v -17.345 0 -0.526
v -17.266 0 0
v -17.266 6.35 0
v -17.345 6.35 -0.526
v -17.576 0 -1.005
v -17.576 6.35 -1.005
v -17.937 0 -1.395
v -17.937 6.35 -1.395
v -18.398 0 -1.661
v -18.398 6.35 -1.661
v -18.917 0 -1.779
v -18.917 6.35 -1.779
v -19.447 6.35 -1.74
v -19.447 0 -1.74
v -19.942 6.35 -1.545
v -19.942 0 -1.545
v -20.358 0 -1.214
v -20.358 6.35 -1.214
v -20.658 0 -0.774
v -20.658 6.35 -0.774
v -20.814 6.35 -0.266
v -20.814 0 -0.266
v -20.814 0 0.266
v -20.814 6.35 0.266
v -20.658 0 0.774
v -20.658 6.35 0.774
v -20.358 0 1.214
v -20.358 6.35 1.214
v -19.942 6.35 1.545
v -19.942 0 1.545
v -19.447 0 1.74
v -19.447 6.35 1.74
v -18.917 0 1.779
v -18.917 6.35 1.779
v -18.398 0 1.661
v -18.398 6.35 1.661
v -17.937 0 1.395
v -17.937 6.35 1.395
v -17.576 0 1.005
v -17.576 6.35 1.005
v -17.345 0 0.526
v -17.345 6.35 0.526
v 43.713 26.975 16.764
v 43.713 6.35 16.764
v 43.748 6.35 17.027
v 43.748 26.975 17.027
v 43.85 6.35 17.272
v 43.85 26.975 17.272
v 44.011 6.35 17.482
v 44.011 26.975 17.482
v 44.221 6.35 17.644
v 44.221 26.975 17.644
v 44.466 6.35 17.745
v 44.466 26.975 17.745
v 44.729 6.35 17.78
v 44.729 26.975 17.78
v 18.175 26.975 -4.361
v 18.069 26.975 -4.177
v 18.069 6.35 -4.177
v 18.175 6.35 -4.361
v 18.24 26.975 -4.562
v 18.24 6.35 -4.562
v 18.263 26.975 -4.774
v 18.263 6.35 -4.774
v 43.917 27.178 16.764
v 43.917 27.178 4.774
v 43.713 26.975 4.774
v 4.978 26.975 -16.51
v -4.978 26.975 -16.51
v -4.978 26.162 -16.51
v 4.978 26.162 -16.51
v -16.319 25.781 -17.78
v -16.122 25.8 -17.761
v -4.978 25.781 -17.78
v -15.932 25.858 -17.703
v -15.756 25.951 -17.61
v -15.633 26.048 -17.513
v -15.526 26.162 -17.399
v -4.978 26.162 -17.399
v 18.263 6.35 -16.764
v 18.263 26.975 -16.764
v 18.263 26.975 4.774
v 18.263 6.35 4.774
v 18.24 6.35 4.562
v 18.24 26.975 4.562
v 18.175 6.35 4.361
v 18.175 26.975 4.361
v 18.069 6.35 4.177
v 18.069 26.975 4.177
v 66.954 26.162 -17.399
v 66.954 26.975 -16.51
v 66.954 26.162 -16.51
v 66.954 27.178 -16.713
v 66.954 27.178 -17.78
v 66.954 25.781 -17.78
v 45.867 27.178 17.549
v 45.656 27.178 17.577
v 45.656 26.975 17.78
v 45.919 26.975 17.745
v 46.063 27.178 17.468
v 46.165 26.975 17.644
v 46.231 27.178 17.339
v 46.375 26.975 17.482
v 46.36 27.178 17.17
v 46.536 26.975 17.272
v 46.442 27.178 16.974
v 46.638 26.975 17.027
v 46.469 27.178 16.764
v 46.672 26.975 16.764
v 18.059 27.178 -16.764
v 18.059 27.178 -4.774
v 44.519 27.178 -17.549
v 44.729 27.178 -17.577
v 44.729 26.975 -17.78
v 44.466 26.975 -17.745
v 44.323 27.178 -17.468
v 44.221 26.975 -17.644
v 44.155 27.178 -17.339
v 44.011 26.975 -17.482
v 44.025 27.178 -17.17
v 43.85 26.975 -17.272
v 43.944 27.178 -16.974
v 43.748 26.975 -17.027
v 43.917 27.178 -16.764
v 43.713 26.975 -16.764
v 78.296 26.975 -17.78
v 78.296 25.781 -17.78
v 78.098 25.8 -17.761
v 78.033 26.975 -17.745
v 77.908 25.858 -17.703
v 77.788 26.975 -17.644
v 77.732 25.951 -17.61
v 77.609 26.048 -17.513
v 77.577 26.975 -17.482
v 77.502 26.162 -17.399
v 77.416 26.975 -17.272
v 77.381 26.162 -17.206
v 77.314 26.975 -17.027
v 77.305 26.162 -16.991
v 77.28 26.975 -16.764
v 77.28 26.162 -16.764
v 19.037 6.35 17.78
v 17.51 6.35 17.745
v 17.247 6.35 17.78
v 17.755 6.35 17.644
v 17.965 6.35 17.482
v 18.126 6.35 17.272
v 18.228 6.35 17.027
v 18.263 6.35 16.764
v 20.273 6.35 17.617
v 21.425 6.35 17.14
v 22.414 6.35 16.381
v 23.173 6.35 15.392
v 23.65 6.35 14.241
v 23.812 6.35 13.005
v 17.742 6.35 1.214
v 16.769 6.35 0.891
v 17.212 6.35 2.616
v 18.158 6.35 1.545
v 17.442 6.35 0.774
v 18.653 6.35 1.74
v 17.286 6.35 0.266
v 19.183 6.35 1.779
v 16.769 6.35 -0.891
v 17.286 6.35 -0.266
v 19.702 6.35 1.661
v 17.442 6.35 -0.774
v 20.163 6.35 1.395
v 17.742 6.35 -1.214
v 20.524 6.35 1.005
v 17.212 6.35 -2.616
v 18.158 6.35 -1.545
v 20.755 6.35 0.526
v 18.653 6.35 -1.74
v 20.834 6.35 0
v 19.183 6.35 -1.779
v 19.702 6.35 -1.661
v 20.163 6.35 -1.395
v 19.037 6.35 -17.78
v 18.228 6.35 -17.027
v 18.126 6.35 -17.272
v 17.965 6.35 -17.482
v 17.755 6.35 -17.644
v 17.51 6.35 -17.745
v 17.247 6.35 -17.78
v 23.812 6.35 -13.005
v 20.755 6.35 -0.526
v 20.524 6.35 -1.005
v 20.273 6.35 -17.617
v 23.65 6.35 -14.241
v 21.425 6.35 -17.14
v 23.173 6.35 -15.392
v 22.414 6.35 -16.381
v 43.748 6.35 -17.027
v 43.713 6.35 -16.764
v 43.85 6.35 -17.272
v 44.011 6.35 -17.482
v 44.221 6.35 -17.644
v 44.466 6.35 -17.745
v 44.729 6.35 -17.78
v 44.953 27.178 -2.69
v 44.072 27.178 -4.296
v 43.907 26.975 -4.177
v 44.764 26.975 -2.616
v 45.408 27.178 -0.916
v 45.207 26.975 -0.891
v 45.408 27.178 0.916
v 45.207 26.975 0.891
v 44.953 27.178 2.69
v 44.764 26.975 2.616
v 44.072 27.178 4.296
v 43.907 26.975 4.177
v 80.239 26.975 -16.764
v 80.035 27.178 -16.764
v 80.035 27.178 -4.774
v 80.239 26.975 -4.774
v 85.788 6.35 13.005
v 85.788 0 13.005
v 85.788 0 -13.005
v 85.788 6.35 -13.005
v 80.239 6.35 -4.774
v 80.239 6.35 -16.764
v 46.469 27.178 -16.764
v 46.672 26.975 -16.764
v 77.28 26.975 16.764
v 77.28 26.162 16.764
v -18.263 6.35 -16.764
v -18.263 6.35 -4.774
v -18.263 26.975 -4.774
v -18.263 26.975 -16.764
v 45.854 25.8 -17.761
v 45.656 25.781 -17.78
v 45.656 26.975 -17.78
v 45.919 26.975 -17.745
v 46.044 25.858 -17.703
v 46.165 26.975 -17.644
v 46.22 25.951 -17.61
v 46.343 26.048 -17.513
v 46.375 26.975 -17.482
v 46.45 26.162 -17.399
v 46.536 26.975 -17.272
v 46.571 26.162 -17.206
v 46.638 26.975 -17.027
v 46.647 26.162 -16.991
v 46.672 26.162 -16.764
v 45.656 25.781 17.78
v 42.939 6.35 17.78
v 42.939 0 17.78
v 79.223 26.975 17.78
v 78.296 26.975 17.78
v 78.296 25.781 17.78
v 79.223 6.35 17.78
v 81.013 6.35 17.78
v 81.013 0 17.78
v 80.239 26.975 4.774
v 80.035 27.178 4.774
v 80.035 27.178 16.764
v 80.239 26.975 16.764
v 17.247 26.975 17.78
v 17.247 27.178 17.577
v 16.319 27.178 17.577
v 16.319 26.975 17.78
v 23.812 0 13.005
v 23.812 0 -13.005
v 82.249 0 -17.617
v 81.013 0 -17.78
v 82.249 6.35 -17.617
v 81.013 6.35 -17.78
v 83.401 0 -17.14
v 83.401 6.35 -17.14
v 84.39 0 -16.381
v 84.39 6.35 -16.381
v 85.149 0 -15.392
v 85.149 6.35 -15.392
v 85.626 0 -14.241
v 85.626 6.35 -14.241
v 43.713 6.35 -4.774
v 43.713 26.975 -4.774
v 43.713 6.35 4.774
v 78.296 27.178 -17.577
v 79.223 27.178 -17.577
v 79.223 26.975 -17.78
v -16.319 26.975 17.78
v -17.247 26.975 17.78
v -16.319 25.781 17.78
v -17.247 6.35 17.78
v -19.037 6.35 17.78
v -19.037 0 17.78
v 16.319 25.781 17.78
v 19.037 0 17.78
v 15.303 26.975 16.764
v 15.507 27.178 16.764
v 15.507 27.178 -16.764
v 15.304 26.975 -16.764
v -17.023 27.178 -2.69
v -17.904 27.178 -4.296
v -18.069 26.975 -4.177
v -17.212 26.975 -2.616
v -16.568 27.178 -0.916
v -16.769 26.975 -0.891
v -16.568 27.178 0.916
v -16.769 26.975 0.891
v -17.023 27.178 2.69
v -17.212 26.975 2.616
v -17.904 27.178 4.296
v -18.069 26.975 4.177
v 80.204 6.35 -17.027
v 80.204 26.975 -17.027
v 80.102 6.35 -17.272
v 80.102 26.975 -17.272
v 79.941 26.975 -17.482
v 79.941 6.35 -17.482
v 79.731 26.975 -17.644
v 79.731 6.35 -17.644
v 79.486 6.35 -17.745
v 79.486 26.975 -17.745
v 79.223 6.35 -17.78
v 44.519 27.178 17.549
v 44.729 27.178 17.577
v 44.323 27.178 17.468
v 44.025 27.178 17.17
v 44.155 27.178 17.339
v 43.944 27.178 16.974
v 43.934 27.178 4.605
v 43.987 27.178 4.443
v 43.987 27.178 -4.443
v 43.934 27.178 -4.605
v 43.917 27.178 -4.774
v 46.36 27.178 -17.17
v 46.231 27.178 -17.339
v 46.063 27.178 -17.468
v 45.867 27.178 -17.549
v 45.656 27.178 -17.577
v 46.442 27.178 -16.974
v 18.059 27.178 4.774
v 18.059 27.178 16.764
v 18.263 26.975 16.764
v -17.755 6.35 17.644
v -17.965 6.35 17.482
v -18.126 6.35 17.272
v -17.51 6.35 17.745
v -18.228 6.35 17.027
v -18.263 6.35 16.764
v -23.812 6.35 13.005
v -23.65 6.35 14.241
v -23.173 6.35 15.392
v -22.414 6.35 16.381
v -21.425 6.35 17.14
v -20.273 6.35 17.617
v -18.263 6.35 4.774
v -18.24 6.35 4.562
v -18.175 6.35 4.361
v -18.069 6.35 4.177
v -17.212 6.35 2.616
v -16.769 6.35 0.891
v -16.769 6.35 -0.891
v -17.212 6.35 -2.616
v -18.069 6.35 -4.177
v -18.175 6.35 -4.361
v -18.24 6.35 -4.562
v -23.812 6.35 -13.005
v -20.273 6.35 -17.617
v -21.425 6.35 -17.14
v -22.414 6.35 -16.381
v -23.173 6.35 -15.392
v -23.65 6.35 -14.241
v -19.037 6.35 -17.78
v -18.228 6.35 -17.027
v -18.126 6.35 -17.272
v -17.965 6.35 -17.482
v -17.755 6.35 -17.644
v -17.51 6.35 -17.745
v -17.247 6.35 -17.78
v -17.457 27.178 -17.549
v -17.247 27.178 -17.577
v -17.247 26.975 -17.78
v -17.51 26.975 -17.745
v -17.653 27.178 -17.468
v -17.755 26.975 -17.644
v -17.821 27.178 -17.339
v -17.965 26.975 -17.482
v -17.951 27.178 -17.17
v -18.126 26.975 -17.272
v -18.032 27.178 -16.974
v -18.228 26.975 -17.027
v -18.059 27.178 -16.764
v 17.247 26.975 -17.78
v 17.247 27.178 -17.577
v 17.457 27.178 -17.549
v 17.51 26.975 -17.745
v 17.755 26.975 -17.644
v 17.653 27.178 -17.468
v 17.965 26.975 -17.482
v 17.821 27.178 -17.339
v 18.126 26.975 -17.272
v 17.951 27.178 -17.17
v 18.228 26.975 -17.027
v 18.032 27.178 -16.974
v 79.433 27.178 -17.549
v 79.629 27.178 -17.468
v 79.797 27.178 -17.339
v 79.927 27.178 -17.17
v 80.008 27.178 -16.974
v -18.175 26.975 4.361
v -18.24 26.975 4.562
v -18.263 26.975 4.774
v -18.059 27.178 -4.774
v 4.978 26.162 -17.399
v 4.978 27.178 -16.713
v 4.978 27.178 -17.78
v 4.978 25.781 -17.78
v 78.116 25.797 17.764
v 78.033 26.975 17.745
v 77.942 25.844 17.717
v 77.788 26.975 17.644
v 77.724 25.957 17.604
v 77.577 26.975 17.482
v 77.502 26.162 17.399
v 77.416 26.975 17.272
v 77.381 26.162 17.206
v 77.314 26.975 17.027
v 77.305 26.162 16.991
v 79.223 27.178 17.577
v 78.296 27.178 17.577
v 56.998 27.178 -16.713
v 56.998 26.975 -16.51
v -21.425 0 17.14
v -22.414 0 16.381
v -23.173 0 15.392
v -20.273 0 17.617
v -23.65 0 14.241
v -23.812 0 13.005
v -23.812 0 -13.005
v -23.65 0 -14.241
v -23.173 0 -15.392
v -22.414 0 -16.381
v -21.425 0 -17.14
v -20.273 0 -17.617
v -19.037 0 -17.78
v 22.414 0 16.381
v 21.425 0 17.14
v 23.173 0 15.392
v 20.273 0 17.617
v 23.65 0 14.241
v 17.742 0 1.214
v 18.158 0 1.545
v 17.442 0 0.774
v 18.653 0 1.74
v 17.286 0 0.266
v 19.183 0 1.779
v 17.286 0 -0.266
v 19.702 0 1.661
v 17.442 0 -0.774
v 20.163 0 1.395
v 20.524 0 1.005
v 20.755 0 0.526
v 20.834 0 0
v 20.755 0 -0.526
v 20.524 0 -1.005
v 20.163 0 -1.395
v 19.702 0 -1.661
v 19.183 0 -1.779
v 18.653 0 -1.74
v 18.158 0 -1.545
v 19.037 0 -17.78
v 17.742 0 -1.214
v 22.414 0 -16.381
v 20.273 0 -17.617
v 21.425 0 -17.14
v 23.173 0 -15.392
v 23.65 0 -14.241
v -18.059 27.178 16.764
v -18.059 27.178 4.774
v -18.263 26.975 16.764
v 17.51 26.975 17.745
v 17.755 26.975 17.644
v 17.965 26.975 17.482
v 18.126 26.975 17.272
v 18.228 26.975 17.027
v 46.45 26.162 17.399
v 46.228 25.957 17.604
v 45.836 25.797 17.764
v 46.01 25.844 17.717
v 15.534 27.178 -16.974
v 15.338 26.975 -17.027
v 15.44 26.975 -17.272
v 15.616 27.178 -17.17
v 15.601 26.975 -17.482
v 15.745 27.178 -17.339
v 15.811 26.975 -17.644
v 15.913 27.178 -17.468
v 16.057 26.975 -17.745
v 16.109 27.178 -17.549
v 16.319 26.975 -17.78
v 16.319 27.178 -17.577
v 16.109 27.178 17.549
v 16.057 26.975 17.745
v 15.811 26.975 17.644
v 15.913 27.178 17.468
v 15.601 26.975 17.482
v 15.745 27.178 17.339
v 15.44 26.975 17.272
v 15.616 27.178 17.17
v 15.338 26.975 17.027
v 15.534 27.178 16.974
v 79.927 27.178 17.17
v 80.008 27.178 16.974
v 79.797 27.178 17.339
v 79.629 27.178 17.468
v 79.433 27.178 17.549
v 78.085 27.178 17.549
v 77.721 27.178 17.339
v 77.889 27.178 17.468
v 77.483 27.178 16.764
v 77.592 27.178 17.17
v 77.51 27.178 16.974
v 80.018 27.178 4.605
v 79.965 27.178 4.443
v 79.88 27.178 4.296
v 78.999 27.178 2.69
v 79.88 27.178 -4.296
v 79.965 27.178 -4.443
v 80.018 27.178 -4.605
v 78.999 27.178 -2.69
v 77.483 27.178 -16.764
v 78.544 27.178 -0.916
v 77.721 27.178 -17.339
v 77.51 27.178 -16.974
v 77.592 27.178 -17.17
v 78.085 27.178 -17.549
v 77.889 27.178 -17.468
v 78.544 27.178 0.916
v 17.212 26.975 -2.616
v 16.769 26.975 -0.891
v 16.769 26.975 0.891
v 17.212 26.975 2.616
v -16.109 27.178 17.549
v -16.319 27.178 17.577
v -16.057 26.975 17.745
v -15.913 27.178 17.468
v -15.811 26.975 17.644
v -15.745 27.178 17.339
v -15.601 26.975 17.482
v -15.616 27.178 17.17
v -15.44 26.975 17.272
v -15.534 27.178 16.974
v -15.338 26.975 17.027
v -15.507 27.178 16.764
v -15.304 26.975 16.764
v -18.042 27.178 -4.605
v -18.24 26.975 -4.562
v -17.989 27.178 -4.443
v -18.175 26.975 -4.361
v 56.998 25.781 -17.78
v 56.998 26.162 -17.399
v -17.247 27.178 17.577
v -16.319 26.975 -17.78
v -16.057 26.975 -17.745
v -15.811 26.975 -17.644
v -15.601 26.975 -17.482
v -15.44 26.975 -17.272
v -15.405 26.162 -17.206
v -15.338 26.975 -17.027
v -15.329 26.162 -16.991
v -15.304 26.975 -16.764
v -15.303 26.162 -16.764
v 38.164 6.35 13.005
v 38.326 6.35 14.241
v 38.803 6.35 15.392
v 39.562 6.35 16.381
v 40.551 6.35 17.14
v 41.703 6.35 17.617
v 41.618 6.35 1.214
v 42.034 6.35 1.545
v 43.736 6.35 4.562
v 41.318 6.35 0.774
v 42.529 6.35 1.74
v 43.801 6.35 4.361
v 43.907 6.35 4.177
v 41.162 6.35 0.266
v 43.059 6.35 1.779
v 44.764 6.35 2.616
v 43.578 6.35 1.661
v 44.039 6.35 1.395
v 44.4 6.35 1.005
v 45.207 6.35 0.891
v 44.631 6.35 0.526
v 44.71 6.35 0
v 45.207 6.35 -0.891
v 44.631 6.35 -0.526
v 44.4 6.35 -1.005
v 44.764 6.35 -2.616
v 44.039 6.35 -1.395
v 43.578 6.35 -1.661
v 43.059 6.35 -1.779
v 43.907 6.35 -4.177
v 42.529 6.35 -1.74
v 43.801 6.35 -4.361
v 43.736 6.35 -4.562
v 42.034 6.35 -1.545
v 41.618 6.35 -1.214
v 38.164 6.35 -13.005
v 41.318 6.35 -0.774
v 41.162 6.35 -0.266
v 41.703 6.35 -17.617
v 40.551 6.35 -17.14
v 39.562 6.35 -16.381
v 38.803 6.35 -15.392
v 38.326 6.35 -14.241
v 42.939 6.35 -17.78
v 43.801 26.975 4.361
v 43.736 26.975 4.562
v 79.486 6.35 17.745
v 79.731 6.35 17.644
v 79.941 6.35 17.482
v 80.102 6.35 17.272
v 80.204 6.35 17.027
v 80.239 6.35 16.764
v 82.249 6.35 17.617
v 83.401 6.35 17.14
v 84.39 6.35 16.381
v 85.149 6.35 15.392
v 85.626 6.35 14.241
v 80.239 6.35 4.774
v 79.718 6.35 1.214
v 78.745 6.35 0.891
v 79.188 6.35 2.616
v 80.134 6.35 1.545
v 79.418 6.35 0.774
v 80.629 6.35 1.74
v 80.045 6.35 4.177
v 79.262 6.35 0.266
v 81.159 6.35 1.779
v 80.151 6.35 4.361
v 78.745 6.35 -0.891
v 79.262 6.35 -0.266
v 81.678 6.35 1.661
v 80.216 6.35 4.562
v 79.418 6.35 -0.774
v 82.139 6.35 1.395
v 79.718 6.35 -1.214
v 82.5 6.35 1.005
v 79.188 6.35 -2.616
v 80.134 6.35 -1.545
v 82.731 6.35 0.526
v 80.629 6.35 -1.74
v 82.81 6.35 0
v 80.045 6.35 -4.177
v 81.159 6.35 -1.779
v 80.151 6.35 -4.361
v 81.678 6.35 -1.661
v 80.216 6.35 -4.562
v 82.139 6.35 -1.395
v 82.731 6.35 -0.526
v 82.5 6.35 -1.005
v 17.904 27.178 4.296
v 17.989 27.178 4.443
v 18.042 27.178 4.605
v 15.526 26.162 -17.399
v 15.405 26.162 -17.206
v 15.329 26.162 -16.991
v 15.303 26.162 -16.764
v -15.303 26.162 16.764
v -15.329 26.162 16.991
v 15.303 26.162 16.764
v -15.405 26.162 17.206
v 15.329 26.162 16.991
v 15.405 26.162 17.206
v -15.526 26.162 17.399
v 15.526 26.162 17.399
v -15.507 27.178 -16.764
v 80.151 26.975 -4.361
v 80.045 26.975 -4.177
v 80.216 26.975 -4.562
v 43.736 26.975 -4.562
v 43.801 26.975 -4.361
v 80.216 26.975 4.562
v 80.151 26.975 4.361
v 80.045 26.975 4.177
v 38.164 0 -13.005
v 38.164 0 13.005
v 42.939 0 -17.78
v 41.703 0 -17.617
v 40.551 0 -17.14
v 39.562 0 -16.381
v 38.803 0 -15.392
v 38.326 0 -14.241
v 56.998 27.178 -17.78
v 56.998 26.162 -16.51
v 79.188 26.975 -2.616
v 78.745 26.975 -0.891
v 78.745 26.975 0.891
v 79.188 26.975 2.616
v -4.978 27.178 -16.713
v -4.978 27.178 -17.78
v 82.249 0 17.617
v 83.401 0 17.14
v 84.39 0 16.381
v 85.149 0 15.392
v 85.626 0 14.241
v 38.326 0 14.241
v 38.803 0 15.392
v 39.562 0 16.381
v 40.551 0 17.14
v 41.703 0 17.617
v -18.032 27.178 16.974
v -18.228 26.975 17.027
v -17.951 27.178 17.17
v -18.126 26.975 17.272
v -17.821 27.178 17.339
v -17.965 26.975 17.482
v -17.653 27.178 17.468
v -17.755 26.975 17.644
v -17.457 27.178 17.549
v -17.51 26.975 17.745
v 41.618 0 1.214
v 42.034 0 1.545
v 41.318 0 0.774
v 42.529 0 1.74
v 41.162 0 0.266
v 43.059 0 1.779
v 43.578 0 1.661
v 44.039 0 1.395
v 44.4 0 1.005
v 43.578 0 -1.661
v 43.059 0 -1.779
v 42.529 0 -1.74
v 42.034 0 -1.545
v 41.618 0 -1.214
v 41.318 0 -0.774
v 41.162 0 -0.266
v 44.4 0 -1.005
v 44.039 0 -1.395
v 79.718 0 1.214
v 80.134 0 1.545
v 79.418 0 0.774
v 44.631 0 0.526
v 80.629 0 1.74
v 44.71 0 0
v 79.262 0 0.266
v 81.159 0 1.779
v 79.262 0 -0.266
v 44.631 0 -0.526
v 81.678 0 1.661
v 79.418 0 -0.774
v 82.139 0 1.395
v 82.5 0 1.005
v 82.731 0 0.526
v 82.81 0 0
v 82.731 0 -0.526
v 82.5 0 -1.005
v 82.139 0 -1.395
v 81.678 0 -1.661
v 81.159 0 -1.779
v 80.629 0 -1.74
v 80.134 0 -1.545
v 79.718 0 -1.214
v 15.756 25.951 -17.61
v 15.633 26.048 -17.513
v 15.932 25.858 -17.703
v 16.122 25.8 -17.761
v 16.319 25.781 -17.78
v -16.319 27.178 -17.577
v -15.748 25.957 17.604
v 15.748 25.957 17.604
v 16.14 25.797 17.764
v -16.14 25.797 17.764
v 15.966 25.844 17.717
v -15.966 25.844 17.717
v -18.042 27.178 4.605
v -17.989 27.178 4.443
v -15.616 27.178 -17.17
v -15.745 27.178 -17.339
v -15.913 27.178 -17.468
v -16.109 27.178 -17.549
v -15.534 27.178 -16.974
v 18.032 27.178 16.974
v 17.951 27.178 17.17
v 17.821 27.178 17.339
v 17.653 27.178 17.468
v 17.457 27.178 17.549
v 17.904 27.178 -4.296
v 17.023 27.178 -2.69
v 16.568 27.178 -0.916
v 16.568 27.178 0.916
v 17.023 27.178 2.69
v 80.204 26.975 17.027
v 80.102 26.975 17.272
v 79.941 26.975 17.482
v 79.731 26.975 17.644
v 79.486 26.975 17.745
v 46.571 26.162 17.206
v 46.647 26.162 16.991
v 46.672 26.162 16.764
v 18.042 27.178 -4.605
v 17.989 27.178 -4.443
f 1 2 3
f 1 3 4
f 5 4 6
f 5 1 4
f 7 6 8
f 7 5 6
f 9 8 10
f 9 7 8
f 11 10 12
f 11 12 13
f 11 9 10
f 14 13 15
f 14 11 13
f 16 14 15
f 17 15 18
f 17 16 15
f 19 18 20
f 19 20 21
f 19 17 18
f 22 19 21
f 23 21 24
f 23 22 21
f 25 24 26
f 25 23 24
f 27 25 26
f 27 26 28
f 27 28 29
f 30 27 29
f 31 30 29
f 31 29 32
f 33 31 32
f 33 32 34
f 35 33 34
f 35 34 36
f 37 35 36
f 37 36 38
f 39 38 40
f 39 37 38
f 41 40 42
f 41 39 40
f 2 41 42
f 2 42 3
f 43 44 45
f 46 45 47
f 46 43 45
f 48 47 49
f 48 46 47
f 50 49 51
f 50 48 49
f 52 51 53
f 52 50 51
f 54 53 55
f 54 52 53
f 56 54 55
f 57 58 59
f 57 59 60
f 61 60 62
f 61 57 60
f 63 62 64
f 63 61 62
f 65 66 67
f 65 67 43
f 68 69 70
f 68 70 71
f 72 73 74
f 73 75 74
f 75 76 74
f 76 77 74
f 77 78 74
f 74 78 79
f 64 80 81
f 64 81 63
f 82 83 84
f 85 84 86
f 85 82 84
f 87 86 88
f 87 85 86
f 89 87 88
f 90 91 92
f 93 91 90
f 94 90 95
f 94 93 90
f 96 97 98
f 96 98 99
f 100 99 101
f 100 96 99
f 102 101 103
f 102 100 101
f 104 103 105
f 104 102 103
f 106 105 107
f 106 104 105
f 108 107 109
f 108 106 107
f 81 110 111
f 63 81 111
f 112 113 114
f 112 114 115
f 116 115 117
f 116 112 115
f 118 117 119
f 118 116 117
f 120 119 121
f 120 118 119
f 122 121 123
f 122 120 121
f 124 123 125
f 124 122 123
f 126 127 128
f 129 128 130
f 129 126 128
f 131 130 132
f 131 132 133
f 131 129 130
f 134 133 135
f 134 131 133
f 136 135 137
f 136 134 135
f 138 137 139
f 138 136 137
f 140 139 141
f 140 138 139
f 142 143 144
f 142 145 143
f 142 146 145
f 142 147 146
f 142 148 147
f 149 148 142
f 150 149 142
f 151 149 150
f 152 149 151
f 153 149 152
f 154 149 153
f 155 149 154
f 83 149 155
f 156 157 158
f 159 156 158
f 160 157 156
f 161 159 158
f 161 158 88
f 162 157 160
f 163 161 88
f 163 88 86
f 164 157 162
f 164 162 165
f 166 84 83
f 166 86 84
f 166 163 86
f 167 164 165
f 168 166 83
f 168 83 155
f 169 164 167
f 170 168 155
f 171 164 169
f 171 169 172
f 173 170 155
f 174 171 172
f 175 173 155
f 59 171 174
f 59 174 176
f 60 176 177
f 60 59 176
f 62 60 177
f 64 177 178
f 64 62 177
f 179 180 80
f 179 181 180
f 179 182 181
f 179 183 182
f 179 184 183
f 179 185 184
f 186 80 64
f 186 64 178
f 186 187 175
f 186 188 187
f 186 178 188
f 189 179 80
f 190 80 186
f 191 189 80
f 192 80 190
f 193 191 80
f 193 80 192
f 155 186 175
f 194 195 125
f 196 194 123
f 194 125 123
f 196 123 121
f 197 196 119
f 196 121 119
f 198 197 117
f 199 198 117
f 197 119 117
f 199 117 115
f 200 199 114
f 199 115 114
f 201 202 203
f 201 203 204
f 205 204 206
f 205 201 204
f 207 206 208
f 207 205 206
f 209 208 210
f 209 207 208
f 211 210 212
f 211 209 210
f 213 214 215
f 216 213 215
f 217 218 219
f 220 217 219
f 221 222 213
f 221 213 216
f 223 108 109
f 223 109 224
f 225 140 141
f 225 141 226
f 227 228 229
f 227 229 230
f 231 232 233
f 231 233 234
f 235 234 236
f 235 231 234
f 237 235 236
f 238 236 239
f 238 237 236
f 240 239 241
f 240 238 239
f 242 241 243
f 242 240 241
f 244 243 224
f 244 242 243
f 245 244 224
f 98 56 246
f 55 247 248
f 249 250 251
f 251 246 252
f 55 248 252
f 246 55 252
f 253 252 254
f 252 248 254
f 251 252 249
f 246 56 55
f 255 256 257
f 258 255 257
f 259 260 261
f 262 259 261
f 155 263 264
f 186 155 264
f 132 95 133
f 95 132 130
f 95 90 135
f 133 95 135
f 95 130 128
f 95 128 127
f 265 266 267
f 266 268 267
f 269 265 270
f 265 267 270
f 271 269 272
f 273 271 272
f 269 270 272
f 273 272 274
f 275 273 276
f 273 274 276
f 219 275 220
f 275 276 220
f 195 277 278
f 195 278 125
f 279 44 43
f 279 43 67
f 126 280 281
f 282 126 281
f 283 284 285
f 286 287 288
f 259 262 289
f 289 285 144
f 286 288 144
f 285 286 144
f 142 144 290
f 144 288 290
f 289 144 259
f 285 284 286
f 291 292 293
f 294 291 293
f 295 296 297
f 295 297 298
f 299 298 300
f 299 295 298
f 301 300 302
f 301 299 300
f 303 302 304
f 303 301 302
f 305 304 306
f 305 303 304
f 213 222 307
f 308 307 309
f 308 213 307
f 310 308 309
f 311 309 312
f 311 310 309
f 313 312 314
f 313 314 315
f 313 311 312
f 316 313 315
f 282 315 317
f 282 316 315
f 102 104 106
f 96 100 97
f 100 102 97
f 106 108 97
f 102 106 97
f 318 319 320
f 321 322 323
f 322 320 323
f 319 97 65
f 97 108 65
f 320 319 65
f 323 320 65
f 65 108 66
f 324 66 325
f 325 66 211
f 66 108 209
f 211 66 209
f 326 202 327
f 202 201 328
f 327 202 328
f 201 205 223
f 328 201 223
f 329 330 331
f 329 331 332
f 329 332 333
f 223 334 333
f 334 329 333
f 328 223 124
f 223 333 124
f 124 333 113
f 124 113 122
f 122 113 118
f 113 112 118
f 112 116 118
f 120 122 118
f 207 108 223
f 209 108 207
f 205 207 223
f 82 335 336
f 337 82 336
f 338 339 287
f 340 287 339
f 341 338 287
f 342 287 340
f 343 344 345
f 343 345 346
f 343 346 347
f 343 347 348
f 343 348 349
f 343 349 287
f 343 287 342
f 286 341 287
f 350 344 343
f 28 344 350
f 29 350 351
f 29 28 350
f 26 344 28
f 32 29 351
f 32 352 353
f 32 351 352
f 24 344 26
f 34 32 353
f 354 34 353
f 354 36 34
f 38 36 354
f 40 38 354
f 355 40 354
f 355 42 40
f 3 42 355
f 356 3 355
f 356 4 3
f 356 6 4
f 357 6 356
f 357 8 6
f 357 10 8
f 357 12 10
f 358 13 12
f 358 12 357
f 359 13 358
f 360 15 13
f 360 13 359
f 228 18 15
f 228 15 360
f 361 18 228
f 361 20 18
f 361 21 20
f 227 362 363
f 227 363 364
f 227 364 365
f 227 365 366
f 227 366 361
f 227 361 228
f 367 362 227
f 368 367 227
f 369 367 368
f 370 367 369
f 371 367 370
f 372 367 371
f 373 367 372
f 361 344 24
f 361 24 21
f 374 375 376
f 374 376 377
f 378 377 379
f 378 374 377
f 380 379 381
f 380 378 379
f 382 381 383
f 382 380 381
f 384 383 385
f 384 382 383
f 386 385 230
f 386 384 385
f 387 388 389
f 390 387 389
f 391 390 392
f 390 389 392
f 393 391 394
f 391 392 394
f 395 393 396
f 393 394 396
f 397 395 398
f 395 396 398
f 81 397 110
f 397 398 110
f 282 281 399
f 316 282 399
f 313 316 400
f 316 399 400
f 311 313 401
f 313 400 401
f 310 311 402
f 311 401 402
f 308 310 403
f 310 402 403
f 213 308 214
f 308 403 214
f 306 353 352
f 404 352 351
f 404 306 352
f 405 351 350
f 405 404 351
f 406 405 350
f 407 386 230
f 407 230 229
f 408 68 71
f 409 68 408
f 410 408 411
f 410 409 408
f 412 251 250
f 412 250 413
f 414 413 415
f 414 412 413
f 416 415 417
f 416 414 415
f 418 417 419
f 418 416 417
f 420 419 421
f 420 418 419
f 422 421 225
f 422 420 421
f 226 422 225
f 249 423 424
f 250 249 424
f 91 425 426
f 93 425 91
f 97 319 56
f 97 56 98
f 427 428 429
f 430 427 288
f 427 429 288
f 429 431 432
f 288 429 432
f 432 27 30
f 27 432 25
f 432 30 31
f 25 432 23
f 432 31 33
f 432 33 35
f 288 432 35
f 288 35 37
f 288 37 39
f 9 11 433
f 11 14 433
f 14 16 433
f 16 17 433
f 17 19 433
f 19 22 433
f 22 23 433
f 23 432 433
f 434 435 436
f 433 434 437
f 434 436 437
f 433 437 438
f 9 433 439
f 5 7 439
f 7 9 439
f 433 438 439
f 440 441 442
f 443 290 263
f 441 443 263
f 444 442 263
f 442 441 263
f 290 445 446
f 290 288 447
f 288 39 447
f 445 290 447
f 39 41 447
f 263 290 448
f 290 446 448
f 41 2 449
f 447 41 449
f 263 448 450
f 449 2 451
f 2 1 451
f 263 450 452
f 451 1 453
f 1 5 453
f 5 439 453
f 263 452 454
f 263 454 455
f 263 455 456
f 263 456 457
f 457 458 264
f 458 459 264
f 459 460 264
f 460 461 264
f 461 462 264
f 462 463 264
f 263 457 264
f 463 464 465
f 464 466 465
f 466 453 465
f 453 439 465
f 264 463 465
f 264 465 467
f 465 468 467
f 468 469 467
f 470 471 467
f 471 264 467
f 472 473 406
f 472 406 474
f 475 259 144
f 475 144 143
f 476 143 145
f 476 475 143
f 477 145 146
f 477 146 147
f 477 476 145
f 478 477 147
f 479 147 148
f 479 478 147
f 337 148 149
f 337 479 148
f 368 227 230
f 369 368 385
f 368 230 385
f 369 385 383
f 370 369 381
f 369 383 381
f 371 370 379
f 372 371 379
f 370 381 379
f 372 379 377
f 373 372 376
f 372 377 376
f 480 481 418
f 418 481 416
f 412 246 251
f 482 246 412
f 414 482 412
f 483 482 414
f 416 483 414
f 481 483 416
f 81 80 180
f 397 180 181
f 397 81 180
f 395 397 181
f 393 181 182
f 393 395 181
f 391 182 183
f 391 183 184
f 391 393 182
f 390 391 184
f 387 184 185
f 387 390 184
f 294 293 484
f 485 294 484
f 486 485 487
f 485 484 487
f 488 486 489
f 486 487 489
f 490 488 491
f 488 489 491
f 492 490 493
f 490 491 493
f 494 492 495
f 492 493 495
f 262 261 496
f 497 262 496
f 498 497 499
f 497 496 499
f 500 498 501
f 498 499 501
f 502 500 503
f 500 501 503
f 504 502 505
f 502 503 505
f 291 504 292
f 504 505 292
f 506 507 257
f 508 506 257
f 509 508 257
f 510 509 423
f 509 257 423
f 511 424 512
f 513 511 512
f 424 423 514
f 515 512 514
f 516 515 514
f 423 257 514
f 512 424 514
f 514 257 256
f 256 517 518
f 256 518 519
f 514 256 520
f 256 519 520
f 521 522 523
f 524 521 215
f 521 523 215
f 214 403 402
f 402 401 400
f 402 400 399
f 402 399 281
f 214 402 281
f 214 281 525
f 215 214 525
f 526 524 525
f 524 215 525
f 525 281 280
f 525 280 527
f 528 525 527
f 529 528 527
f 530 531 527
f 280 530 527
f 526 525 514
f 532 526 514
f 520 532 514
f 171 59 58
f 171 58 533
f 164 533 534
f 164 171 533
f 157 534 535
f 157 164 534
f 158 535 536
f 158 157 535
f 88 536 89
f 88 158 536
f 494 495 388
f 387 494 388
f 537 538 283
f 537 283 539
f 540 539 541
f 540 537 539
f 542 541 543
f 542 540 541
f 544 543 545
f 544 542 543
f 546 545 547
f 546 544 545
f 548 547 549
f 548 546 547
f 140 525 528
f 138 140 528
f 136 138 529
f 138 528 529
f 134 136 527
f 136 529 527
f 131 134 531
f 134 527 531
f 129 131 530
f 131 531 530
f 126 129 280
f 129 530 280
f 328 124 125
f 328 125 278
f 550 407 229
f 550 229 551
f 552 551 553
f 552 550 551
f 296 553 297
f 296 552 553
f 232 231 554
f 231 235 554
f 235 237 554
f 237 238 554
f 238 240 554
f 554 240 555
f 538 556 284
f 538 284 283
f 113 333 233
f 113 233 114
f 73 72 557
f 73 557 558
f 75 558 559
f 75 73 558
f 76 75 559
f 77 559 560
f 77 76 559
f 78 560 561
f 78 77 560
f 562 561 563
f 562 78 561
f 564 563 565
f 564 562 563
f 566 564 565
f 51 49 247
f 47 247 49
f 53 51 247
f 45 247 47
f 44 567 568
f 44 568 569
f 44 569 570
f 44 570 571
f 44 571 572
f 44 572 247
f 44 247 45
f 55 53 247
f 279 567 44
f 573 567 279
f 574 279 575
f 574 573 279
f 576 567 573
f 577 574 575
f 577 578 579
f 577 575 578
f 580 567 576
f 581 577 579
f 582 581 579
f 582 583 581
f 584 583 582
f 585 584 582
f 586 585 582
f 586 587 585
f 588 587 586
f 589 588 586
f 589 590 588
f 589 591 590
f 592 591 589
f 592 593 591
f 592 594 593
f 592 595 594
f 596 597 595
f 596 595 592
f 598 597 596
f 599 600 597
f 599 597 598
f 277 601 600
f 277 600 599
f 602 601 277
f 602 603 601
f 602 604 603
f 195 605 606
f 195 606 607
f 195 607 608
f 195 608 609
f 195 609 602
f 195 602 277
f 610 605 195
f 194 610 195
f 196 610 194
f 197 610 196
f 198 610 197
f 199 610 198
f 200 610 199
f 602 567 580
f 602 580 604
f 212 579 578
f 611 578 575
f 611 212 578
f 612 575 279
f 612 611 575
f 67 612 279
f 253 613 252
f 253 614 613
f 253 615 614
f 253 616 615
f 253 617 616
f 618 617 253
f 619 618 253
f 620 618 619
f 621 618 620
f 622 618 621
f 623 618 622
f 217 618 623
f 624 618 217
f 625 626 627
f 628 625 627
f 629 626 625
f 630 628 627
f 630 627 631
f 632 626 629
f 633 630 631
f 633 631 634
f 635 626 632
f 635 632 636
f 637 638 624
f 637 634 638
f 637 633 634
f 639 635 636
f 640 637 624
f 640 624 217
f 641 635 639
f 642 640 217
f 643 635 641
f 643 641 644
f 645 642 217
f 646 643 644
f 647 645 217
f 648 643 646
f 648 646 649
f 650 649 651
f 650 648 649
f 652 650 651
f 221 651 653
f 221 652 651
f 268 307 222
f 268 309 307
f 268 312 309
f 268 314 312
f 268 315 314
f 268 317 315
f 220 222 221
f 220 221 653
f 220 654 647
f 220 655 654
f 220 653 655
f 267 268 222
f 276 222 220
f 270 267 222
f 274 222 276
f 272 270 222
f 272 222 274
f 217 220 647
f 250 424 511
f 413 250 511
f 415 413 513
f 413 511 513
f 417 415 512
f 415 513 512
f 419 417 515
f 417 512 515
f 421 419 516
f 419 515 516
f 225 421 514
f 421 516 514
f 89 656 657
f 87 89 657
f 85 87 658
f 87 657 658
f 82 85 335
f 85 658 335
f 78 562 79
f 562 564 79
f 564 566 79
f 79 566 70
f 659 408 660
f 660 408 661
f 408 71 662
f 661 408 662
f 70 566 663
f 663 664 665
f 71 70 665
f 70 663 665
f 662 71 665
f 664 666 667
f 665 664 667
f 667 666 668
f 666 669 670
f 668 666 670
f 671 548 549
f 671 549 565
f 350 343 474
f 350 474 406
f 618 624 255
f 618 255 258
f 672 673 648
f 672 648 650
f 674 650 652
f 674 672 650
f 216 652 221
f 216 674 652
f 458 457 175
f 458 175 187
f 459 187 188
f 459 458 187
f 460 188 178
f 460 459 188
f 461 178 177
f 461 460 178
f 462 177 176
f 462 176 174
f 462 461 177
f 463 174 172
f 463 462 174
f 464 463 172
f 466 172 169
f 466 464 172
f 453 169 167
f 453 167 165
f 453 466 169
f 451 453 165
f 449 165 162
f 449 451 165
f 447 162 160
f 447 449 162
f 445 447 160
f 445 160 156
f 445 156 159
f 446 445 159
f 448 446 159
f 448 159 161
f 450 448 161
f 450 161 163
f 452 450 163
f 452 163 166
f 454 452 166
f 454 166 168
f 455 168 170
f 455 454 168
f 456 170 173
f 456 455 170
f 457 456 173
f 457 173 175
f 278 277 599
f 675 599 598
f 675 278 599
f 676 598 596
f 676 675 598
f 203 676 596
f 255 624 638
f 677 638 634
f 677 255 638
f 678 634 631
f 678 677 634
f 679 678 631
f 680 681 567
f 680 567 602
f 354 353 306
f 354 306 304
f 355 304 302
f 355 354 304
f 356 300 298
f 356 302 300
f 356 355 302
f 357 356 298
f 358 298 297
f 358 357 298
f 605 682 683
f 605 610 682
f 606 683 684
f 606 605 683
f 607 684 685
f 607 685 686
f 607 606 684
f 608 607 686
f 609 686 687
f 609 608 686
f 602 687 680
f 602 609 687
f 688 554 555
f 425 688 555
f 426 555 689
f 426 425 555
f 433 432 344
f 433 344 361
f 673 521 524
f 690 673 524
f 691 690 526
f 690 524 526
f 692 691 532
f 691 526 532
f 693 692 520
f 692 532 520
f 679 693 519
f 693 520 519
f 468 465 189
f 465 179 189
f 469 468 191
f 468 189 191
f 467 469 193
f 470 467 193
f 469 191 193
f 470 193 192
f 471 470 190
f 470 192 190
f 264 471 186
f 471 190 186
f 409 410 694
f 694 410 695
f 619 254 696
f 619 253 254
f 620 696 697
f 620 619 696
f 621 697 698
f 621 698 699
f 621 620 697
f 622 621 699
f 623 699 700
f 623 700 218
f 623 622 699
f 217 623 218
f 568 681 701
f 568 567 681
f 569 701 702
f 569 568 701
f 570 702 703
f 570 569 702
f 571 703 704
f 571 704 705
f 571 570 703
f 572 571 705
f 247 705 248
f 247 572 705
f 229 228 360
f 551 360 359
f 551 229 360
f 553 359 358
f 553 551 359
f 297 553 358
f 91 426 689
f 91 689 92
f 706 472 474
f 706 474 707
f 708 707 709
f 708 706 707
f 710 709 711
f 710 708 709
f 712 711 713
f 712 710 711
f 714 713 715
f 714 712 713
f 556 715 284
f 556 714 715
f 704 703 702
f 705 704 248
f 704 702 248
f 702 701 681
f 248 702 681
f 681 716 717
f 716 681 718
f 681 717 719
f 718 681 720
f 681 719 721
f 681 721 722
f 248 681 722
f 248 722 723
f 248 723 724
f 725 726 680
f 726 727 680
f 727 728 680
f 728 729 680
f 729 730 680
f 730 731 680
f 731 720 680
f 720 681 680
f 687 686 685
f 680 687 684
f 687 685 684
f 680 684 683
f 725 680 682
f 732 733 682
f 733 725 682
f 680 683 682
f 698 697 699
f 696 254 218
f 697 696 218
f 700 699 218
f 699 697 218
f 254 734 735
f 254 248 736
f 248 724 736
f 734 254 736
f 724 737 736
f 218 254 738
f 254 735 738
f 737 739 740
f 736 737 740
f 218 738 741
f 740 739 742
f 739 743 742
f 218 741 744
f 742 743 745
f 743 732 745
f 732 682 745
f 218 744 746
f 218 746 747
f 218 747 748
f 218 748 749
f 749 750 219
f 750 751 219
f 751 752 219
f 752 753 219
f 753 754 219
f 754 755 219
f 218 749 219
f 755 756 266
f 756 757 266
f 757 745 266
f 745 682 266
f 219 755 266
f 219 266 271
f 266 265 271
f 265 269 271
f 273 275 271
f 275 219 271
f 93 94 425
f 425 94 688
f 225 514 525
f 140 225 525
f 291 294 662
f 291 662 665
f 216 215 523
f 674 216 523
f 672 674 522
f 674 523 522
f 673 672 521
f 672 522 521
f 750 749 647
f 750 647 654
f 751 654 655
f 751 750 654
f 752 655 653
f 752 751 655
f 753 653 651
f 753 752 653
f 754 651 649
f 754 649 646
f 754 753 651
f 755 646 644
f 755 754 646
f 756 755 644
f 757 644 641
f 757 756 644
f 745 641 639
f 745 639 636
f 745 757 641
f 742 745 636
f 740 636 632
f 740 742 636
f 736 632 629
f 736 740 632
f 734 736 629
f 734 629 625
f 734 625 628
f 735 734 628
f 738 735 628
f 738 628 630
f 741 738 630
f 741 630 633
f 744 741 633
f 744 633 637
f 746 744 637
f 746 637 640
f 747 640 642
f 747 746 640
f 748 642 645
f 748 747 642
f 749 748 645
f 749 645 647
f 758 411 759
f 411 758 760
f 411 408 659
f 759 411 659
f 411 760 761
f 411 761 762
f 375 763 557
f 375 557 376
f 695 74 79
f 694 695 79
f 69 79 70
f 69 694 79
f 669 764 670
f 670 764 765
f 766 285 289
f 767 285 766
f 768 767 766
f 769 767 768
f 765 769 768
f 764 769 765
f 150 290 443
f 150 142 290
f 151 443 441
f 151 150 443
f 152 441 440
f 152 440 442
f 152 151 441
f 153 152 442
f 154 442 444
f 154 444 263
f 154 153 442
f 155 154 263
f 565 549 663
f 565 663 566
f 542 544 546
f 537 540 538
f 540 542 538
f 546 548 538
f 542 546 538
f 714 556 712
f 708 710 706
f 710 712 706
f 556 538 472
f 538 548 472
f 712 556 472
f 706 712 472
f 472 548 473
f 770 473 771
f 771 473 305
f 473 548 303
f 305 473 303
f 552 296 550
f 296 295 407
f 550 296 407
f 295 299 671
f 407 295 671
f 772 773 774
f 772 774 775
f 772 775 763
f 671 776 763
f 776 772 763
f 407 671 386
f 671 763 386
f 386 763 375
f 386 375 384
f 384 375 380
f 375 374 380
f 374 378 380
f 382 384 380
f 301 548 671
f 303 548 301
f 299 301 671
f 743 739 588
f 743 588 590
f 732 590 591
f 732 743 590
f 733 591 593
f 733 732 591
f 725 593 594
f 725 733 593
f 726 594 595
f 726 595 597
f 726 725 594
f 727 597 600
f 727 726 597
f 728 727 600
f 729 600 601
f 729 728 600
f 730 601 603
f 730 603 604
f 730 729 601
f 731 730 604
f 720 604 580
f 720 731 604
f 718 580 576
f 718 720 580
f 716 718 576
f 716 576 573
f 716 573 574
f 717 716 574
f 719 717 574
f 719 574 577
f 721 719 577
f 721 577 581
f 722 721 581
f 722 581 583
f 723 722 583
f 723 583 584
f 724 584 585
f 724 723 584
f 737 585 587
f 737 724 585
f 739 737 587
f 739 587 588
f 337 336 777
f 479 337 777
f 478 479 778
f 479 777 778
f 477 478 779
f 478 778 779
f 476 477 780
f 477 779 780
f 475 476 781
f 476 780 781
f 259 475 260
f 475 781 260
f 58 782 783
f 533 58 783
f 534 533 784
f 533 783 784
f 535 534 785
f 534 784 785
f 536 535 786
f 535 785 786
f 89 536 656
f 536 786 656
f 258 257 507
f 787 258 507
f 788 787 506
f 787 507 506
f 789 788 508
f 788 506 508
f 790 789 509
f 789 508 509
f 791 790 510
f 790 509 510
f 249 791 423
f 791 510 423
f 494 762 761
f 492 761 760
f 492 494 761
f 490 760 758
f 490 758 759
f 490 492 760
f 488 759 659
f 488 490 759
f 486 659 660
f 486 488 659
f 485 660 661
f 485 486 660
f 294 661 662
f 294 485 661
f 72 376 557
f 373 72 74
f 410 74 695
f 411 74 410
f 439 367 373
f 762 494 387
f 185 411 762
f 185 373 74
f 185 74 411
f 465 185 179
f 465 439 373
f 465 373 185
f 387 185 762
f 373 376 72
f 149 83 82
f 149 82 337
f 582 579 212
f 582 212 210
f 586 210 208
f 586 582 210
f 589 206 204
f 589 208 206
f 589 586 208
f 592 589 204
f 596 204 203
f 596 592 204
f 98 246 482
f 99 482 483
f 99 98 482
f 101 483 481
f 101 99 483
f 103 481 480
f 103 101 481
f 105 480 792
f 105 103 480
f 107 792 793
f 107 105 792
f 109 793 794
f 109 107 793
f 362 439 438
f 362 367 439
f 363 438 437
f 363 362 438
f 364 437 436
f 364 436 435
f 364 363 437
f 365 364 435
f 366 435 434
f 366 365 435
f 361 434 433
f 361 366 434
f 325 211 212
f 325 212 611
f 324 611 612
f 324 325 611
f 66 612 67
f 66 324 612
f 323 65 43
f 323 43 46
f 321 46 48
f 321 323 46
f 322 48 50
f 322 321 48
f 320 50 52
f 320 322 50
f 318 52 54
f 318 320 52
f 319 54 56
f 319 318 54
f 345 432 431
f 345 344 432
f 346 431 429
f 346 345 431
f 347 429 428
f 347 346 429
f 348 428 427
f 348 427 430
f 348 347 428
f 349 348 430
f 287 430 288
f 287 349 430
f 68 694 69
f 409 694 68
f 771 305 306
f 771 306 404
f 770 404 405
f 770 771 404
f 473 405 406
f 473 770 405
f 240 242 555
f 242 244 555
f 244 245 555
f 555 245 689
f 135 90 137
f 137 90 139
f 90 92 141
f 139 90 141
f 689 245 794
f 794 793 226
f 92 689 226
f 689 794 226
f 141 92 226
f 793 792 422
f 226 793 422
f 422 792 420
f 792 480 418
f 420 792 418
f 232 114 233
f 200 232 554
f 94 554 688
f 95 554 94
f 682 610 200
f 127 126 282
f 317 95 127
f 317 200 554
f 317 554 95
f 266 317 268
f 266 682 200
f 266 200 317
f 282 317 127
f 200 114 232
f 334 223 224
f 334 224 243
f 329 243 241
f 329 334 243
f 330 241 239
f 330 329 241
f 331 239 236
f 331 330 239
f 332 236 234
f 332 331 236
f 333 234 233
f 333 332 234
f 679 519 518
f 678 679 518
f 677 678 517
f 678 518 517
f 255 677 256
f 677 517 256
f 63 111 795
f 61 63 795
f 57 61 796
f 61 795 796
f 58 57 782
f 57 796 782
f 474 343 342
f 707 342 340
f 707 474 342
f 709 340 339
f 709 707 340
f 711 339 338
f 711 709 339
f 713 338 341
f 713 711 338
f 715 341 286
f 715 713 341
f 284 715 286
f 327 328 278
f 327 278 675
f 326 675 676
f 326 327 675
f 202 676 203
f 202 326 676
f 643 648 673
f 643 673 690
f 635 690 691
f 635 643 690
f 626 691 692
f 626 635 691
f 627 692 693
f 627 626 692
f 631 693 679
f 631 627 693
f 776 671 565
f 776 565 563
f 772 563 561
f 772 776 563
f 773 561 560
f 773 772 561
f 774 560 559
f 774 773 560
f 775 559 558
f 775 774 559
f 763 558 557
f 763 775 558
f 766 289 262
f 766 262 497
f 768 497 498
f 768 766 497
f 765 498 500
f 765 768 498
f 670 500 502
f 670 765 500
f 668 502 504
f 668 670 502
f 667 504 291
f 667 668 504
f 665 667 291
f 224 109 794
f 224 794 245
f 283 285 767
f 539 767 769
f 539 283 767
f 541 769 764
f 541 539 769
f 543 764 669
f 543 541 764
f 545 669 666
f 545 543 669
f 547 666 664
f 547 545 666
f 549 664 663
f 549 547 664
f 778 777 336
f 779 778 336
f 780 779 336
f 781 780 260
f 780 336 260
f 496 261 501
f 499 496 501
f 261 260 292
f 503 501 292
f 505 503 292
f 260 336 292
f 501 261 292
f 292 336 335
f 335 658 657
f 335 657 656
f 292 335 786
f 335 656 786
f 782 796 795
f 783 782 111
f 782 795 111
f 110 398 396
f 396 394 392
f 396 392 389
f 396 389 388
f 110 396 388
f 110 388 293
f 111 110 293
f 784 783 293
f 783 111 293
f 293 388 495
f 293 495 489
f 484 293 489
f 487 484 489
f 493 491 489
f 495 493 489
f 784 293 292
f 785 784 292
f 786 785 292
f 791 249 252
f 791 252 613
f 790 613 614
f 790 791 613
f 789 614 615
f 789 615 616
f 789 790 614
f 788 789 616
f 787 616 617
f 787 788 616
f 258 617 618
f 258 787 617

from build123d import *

# Parameters (mm, degrees)
EXTRUDE1_DEPTH                       = 27.178
SKETCH8_W                            = 50.8
SKETCH8_H                            = 50.8
EXTRUDE2_DEPTH                       = 6.35
CUT_EXTRUDE1_DEPTH                   = 1.016
FILLET3_R                            = 1.016
SKETCH9_OUTSIDE_W                    = 68.162
SKETCH9_OUTSIDE_H                    = 68.162
SKETCH9_OUTSIDE_W_2                  = 47.625
SKETCH9_OUTSIDE_H_2                  = 35.56
CUT_EXTRUDE3_DEPTH                   = 46.044019403
F_28_0_1405_DIAMETER_HOLE1_OUTLINE_R = 1.78435
F_28_0_1405_DIAMETER_HOLE1_DEPTH     = 6.35
FILLET5_R                            = 4.7752
FILLET2_R                            = 1.016
CHAMFER4_SIZE                        = 0.2032
CHAMFER5_SIZE                        = 0.381


# Read off the part's stored shape, not the designer's step: #28 (0.1405) Diameter Hole1
with BuildPart() as part:
    # Sketch1 → Extrude1 (new body)
    with BuildSketch(Plane(origin=(0, 0, 0), x_dir=(1, 0, 0), z_dir=(0, 1, 0))):
        with BuildLine():
            Line((-18.2626, 17.78), (18.2626, 17.78))
            Line((18.2626, 17.78), (18.2626, 4.431481156))
            ThreePointArc((18.2626, 4.431481156), (16.7132, 0), (18.2626, -4.431481156))
            Line((18.2626, -4.431481156), (18.2626, -17.78))
            Line((18.2626, -17.78), (-18.2626, -17.78))
            Line((-18.2626, -17.78), (-18.2626, -4.431481156))
            ThreePointArc((-18.2626, -4.431481156), (-16.7132, 0), (-18.2626, 4.431481156))
            Line((-18.2626, 4.431481156), (-18.2626, 17.78))
        make_face()
    extrude(amount=EXTRUDE1_DEPTH)

    # Sketch8 → Extrude2 (add)
    with BuildSketch(Plane(origin=(0, 0, 0), x_dir=(1, 0, 0), z_dir=(0, 1, 0))):
        Rectangle(SKETCH8_W, SKETCH8_H)
    extrude(amount=EXTRUDE2_DEPTH)

    # Sketch6 → Cut-Extrude1 (cut)
    with BuildSketch(Plane(origin=(0, 27.178, 0), x_dir=(-1, 0, 0), z_dir=(0, 1, 0))):
        Polygon((-15.3035, 24.453887049), (15.3035, 24.453887049), (15.3035, -24.453887049), (4.9784, -24.453887049), (4.9784, -16.51), (-4.9784, -16.51), (-4.9784, -24.453887049), (-15.3035, -24.453887049), align=None)
    extrude(amount=-CUT_EXTRUDE1_DEPTH, mode=Mode.SUBTRACT)

    # Fillet3
    fillet3_edges = [part.edges().sort_by_distance(p)[0] for p in [
        (-18.2626, 16.764, -17.78),
        (18.2626, 16.764, -17.78),
        (18.2626, 16.764, -4.431481156),
        (18.2626, 16.764, 4.431481156),
        (18.2626, 16.764, 17.78),
        (-18.2626, 16.764, 17.78),
        (-18.2626, 16.764, 4.431481156),
        (-18.2626, 16.764, -4.431481156),
    ]]
    fillet(fillet3_edges, radius=FILLET3_R)

    # Sketch9 outside → Cut-Extrude3 (cut, through all)
    with BuildSketch(Plane(origin=(0, 0, 0), x_dir=(1, 0, 0), z_dir=(0, 1, 0))):
        Rectangle(SKETCH9_OUTSIDE_W, SKETCH9_OUTSIDE_H)
        Rectangle(SKETCH9_OUTSIDE_W_2, SKETCH9_OUTSIDE_H_2, mode=Mode.SUBTRACT)
    extrude(amount=CUT_EXTRUDE3_DEPTH, mode=Mode.SUBTRACT)

    # #28 (0.1405) Diameter Hole1 outline → #28 (0.1405) Diameter Hole1 (cut)
    with BuildSketch(Plane(origin=(0, 0, 0), x_dir=(1, 0, 0), z_dir=(0, 1, 0))):
        with Locations((19.05, 0)):
            Circle(F_28_0_1405_DIAMETER_HOLE1_OUTLINE_R)
        with Locations((-19.05, 0)):
            Circle(F_28_0_1405_DIAMETER_HOLE1_OUTLINE_R)
    extrude(amount=F_28_0_1405_DIAMETER_HOLE1_DEPTH, mode=Mode.SUBTRACT)

    # Fillet5
    fillet5_edges = [part.edges().sort_by_distance(p)[0] for p in [
        (-23.8125, 3.175, 17.78),
        (23.8125, 3.175, 17.78),
        (23.8125, 3.175, -17.78),
        (-23.8125, 3.175, -17.78),
    ]]
    fillet(fillet5_edges, radius=FILLET5_R)

    # Fillet2
    fillet2_edges = [part.edges().sort_by_distance(p)[0] for p in [
        (-15.3035, 26.67, 17.78),
        (-15.3035, 26.67, -17.78),
        (15.3035, 26.67, 17.78),
        (15.3035, 26.67, -17.78),
    ]]
    fillet(fillet2_edges, radius=FILLET2_R)

    # Chamfer4
    chamfer4_edges = [part.edges().sort_by_distance(p)[0] for p in [
        (16.78305, 27.178, -17.78),
        (18.2626, 27.178, -10.768755436),
        (17.96502049, 27.178, 17.48242049),
        (17.96502049, 27.178, -17.48242049),
        (18.212969029, 27.178, -4.45984401),
        (18.212969029, 27.178, 4.45984401),
        (16.78305, 27.178, 17.78),
        (-15.3035, 27.178, 0),
        (-16.78305, 27.178, -17.78),
        (-15.60107951, 27.178, -17.48242049),
        (-15.60107951, 27.178, 17.48242049),
        (15.3035, 27.178, 0),
        (15.60107951, 27.178, 17.48242049),
        (15.60107951, 27.178, -17.48242049),
        (0, 27.178, -16.51),
        (-18.2626, 27.178, 10.768755436),
        (-16.7132, 27.178, 0),
        (-16.78305, 27.178, 17.78),
        (-18.2626, 27.178, -10.768755436),
        (-17.96502049, 27.178, 17.48242049),
        (-17.96502049, 27.178, -17.48242049),
        (-18.212969029, 27.178, -4.45984401),
        (-18.212969029, 27.178, 4.45984401),
        (16.7132, 27.178, 0),
        (18.2626, 27.178, 10.768755436),
    ]]
    chamfer(chamfer4_edges, length=CHAMFER4_SIZE)

    # Chamfer5
    chamfer5_edges = [part.edges().sort_by_distance(p)[0] for p in [
        (10.64895, 26.162, -17.78),
        (-10.64895, 26.162, -17.78),
        (0, 26.162, 17.78),
    ]]
    chamfer(chamfer5_edges, length=CHAMFER5_SIZE)


with BuildPart() as body_2:
    # Body-Move/Copy1: copy of part
    add(part.part.moved(Location((61.976, -5e-08, 0))))


solid = Compound([part.part, body_2.part])
